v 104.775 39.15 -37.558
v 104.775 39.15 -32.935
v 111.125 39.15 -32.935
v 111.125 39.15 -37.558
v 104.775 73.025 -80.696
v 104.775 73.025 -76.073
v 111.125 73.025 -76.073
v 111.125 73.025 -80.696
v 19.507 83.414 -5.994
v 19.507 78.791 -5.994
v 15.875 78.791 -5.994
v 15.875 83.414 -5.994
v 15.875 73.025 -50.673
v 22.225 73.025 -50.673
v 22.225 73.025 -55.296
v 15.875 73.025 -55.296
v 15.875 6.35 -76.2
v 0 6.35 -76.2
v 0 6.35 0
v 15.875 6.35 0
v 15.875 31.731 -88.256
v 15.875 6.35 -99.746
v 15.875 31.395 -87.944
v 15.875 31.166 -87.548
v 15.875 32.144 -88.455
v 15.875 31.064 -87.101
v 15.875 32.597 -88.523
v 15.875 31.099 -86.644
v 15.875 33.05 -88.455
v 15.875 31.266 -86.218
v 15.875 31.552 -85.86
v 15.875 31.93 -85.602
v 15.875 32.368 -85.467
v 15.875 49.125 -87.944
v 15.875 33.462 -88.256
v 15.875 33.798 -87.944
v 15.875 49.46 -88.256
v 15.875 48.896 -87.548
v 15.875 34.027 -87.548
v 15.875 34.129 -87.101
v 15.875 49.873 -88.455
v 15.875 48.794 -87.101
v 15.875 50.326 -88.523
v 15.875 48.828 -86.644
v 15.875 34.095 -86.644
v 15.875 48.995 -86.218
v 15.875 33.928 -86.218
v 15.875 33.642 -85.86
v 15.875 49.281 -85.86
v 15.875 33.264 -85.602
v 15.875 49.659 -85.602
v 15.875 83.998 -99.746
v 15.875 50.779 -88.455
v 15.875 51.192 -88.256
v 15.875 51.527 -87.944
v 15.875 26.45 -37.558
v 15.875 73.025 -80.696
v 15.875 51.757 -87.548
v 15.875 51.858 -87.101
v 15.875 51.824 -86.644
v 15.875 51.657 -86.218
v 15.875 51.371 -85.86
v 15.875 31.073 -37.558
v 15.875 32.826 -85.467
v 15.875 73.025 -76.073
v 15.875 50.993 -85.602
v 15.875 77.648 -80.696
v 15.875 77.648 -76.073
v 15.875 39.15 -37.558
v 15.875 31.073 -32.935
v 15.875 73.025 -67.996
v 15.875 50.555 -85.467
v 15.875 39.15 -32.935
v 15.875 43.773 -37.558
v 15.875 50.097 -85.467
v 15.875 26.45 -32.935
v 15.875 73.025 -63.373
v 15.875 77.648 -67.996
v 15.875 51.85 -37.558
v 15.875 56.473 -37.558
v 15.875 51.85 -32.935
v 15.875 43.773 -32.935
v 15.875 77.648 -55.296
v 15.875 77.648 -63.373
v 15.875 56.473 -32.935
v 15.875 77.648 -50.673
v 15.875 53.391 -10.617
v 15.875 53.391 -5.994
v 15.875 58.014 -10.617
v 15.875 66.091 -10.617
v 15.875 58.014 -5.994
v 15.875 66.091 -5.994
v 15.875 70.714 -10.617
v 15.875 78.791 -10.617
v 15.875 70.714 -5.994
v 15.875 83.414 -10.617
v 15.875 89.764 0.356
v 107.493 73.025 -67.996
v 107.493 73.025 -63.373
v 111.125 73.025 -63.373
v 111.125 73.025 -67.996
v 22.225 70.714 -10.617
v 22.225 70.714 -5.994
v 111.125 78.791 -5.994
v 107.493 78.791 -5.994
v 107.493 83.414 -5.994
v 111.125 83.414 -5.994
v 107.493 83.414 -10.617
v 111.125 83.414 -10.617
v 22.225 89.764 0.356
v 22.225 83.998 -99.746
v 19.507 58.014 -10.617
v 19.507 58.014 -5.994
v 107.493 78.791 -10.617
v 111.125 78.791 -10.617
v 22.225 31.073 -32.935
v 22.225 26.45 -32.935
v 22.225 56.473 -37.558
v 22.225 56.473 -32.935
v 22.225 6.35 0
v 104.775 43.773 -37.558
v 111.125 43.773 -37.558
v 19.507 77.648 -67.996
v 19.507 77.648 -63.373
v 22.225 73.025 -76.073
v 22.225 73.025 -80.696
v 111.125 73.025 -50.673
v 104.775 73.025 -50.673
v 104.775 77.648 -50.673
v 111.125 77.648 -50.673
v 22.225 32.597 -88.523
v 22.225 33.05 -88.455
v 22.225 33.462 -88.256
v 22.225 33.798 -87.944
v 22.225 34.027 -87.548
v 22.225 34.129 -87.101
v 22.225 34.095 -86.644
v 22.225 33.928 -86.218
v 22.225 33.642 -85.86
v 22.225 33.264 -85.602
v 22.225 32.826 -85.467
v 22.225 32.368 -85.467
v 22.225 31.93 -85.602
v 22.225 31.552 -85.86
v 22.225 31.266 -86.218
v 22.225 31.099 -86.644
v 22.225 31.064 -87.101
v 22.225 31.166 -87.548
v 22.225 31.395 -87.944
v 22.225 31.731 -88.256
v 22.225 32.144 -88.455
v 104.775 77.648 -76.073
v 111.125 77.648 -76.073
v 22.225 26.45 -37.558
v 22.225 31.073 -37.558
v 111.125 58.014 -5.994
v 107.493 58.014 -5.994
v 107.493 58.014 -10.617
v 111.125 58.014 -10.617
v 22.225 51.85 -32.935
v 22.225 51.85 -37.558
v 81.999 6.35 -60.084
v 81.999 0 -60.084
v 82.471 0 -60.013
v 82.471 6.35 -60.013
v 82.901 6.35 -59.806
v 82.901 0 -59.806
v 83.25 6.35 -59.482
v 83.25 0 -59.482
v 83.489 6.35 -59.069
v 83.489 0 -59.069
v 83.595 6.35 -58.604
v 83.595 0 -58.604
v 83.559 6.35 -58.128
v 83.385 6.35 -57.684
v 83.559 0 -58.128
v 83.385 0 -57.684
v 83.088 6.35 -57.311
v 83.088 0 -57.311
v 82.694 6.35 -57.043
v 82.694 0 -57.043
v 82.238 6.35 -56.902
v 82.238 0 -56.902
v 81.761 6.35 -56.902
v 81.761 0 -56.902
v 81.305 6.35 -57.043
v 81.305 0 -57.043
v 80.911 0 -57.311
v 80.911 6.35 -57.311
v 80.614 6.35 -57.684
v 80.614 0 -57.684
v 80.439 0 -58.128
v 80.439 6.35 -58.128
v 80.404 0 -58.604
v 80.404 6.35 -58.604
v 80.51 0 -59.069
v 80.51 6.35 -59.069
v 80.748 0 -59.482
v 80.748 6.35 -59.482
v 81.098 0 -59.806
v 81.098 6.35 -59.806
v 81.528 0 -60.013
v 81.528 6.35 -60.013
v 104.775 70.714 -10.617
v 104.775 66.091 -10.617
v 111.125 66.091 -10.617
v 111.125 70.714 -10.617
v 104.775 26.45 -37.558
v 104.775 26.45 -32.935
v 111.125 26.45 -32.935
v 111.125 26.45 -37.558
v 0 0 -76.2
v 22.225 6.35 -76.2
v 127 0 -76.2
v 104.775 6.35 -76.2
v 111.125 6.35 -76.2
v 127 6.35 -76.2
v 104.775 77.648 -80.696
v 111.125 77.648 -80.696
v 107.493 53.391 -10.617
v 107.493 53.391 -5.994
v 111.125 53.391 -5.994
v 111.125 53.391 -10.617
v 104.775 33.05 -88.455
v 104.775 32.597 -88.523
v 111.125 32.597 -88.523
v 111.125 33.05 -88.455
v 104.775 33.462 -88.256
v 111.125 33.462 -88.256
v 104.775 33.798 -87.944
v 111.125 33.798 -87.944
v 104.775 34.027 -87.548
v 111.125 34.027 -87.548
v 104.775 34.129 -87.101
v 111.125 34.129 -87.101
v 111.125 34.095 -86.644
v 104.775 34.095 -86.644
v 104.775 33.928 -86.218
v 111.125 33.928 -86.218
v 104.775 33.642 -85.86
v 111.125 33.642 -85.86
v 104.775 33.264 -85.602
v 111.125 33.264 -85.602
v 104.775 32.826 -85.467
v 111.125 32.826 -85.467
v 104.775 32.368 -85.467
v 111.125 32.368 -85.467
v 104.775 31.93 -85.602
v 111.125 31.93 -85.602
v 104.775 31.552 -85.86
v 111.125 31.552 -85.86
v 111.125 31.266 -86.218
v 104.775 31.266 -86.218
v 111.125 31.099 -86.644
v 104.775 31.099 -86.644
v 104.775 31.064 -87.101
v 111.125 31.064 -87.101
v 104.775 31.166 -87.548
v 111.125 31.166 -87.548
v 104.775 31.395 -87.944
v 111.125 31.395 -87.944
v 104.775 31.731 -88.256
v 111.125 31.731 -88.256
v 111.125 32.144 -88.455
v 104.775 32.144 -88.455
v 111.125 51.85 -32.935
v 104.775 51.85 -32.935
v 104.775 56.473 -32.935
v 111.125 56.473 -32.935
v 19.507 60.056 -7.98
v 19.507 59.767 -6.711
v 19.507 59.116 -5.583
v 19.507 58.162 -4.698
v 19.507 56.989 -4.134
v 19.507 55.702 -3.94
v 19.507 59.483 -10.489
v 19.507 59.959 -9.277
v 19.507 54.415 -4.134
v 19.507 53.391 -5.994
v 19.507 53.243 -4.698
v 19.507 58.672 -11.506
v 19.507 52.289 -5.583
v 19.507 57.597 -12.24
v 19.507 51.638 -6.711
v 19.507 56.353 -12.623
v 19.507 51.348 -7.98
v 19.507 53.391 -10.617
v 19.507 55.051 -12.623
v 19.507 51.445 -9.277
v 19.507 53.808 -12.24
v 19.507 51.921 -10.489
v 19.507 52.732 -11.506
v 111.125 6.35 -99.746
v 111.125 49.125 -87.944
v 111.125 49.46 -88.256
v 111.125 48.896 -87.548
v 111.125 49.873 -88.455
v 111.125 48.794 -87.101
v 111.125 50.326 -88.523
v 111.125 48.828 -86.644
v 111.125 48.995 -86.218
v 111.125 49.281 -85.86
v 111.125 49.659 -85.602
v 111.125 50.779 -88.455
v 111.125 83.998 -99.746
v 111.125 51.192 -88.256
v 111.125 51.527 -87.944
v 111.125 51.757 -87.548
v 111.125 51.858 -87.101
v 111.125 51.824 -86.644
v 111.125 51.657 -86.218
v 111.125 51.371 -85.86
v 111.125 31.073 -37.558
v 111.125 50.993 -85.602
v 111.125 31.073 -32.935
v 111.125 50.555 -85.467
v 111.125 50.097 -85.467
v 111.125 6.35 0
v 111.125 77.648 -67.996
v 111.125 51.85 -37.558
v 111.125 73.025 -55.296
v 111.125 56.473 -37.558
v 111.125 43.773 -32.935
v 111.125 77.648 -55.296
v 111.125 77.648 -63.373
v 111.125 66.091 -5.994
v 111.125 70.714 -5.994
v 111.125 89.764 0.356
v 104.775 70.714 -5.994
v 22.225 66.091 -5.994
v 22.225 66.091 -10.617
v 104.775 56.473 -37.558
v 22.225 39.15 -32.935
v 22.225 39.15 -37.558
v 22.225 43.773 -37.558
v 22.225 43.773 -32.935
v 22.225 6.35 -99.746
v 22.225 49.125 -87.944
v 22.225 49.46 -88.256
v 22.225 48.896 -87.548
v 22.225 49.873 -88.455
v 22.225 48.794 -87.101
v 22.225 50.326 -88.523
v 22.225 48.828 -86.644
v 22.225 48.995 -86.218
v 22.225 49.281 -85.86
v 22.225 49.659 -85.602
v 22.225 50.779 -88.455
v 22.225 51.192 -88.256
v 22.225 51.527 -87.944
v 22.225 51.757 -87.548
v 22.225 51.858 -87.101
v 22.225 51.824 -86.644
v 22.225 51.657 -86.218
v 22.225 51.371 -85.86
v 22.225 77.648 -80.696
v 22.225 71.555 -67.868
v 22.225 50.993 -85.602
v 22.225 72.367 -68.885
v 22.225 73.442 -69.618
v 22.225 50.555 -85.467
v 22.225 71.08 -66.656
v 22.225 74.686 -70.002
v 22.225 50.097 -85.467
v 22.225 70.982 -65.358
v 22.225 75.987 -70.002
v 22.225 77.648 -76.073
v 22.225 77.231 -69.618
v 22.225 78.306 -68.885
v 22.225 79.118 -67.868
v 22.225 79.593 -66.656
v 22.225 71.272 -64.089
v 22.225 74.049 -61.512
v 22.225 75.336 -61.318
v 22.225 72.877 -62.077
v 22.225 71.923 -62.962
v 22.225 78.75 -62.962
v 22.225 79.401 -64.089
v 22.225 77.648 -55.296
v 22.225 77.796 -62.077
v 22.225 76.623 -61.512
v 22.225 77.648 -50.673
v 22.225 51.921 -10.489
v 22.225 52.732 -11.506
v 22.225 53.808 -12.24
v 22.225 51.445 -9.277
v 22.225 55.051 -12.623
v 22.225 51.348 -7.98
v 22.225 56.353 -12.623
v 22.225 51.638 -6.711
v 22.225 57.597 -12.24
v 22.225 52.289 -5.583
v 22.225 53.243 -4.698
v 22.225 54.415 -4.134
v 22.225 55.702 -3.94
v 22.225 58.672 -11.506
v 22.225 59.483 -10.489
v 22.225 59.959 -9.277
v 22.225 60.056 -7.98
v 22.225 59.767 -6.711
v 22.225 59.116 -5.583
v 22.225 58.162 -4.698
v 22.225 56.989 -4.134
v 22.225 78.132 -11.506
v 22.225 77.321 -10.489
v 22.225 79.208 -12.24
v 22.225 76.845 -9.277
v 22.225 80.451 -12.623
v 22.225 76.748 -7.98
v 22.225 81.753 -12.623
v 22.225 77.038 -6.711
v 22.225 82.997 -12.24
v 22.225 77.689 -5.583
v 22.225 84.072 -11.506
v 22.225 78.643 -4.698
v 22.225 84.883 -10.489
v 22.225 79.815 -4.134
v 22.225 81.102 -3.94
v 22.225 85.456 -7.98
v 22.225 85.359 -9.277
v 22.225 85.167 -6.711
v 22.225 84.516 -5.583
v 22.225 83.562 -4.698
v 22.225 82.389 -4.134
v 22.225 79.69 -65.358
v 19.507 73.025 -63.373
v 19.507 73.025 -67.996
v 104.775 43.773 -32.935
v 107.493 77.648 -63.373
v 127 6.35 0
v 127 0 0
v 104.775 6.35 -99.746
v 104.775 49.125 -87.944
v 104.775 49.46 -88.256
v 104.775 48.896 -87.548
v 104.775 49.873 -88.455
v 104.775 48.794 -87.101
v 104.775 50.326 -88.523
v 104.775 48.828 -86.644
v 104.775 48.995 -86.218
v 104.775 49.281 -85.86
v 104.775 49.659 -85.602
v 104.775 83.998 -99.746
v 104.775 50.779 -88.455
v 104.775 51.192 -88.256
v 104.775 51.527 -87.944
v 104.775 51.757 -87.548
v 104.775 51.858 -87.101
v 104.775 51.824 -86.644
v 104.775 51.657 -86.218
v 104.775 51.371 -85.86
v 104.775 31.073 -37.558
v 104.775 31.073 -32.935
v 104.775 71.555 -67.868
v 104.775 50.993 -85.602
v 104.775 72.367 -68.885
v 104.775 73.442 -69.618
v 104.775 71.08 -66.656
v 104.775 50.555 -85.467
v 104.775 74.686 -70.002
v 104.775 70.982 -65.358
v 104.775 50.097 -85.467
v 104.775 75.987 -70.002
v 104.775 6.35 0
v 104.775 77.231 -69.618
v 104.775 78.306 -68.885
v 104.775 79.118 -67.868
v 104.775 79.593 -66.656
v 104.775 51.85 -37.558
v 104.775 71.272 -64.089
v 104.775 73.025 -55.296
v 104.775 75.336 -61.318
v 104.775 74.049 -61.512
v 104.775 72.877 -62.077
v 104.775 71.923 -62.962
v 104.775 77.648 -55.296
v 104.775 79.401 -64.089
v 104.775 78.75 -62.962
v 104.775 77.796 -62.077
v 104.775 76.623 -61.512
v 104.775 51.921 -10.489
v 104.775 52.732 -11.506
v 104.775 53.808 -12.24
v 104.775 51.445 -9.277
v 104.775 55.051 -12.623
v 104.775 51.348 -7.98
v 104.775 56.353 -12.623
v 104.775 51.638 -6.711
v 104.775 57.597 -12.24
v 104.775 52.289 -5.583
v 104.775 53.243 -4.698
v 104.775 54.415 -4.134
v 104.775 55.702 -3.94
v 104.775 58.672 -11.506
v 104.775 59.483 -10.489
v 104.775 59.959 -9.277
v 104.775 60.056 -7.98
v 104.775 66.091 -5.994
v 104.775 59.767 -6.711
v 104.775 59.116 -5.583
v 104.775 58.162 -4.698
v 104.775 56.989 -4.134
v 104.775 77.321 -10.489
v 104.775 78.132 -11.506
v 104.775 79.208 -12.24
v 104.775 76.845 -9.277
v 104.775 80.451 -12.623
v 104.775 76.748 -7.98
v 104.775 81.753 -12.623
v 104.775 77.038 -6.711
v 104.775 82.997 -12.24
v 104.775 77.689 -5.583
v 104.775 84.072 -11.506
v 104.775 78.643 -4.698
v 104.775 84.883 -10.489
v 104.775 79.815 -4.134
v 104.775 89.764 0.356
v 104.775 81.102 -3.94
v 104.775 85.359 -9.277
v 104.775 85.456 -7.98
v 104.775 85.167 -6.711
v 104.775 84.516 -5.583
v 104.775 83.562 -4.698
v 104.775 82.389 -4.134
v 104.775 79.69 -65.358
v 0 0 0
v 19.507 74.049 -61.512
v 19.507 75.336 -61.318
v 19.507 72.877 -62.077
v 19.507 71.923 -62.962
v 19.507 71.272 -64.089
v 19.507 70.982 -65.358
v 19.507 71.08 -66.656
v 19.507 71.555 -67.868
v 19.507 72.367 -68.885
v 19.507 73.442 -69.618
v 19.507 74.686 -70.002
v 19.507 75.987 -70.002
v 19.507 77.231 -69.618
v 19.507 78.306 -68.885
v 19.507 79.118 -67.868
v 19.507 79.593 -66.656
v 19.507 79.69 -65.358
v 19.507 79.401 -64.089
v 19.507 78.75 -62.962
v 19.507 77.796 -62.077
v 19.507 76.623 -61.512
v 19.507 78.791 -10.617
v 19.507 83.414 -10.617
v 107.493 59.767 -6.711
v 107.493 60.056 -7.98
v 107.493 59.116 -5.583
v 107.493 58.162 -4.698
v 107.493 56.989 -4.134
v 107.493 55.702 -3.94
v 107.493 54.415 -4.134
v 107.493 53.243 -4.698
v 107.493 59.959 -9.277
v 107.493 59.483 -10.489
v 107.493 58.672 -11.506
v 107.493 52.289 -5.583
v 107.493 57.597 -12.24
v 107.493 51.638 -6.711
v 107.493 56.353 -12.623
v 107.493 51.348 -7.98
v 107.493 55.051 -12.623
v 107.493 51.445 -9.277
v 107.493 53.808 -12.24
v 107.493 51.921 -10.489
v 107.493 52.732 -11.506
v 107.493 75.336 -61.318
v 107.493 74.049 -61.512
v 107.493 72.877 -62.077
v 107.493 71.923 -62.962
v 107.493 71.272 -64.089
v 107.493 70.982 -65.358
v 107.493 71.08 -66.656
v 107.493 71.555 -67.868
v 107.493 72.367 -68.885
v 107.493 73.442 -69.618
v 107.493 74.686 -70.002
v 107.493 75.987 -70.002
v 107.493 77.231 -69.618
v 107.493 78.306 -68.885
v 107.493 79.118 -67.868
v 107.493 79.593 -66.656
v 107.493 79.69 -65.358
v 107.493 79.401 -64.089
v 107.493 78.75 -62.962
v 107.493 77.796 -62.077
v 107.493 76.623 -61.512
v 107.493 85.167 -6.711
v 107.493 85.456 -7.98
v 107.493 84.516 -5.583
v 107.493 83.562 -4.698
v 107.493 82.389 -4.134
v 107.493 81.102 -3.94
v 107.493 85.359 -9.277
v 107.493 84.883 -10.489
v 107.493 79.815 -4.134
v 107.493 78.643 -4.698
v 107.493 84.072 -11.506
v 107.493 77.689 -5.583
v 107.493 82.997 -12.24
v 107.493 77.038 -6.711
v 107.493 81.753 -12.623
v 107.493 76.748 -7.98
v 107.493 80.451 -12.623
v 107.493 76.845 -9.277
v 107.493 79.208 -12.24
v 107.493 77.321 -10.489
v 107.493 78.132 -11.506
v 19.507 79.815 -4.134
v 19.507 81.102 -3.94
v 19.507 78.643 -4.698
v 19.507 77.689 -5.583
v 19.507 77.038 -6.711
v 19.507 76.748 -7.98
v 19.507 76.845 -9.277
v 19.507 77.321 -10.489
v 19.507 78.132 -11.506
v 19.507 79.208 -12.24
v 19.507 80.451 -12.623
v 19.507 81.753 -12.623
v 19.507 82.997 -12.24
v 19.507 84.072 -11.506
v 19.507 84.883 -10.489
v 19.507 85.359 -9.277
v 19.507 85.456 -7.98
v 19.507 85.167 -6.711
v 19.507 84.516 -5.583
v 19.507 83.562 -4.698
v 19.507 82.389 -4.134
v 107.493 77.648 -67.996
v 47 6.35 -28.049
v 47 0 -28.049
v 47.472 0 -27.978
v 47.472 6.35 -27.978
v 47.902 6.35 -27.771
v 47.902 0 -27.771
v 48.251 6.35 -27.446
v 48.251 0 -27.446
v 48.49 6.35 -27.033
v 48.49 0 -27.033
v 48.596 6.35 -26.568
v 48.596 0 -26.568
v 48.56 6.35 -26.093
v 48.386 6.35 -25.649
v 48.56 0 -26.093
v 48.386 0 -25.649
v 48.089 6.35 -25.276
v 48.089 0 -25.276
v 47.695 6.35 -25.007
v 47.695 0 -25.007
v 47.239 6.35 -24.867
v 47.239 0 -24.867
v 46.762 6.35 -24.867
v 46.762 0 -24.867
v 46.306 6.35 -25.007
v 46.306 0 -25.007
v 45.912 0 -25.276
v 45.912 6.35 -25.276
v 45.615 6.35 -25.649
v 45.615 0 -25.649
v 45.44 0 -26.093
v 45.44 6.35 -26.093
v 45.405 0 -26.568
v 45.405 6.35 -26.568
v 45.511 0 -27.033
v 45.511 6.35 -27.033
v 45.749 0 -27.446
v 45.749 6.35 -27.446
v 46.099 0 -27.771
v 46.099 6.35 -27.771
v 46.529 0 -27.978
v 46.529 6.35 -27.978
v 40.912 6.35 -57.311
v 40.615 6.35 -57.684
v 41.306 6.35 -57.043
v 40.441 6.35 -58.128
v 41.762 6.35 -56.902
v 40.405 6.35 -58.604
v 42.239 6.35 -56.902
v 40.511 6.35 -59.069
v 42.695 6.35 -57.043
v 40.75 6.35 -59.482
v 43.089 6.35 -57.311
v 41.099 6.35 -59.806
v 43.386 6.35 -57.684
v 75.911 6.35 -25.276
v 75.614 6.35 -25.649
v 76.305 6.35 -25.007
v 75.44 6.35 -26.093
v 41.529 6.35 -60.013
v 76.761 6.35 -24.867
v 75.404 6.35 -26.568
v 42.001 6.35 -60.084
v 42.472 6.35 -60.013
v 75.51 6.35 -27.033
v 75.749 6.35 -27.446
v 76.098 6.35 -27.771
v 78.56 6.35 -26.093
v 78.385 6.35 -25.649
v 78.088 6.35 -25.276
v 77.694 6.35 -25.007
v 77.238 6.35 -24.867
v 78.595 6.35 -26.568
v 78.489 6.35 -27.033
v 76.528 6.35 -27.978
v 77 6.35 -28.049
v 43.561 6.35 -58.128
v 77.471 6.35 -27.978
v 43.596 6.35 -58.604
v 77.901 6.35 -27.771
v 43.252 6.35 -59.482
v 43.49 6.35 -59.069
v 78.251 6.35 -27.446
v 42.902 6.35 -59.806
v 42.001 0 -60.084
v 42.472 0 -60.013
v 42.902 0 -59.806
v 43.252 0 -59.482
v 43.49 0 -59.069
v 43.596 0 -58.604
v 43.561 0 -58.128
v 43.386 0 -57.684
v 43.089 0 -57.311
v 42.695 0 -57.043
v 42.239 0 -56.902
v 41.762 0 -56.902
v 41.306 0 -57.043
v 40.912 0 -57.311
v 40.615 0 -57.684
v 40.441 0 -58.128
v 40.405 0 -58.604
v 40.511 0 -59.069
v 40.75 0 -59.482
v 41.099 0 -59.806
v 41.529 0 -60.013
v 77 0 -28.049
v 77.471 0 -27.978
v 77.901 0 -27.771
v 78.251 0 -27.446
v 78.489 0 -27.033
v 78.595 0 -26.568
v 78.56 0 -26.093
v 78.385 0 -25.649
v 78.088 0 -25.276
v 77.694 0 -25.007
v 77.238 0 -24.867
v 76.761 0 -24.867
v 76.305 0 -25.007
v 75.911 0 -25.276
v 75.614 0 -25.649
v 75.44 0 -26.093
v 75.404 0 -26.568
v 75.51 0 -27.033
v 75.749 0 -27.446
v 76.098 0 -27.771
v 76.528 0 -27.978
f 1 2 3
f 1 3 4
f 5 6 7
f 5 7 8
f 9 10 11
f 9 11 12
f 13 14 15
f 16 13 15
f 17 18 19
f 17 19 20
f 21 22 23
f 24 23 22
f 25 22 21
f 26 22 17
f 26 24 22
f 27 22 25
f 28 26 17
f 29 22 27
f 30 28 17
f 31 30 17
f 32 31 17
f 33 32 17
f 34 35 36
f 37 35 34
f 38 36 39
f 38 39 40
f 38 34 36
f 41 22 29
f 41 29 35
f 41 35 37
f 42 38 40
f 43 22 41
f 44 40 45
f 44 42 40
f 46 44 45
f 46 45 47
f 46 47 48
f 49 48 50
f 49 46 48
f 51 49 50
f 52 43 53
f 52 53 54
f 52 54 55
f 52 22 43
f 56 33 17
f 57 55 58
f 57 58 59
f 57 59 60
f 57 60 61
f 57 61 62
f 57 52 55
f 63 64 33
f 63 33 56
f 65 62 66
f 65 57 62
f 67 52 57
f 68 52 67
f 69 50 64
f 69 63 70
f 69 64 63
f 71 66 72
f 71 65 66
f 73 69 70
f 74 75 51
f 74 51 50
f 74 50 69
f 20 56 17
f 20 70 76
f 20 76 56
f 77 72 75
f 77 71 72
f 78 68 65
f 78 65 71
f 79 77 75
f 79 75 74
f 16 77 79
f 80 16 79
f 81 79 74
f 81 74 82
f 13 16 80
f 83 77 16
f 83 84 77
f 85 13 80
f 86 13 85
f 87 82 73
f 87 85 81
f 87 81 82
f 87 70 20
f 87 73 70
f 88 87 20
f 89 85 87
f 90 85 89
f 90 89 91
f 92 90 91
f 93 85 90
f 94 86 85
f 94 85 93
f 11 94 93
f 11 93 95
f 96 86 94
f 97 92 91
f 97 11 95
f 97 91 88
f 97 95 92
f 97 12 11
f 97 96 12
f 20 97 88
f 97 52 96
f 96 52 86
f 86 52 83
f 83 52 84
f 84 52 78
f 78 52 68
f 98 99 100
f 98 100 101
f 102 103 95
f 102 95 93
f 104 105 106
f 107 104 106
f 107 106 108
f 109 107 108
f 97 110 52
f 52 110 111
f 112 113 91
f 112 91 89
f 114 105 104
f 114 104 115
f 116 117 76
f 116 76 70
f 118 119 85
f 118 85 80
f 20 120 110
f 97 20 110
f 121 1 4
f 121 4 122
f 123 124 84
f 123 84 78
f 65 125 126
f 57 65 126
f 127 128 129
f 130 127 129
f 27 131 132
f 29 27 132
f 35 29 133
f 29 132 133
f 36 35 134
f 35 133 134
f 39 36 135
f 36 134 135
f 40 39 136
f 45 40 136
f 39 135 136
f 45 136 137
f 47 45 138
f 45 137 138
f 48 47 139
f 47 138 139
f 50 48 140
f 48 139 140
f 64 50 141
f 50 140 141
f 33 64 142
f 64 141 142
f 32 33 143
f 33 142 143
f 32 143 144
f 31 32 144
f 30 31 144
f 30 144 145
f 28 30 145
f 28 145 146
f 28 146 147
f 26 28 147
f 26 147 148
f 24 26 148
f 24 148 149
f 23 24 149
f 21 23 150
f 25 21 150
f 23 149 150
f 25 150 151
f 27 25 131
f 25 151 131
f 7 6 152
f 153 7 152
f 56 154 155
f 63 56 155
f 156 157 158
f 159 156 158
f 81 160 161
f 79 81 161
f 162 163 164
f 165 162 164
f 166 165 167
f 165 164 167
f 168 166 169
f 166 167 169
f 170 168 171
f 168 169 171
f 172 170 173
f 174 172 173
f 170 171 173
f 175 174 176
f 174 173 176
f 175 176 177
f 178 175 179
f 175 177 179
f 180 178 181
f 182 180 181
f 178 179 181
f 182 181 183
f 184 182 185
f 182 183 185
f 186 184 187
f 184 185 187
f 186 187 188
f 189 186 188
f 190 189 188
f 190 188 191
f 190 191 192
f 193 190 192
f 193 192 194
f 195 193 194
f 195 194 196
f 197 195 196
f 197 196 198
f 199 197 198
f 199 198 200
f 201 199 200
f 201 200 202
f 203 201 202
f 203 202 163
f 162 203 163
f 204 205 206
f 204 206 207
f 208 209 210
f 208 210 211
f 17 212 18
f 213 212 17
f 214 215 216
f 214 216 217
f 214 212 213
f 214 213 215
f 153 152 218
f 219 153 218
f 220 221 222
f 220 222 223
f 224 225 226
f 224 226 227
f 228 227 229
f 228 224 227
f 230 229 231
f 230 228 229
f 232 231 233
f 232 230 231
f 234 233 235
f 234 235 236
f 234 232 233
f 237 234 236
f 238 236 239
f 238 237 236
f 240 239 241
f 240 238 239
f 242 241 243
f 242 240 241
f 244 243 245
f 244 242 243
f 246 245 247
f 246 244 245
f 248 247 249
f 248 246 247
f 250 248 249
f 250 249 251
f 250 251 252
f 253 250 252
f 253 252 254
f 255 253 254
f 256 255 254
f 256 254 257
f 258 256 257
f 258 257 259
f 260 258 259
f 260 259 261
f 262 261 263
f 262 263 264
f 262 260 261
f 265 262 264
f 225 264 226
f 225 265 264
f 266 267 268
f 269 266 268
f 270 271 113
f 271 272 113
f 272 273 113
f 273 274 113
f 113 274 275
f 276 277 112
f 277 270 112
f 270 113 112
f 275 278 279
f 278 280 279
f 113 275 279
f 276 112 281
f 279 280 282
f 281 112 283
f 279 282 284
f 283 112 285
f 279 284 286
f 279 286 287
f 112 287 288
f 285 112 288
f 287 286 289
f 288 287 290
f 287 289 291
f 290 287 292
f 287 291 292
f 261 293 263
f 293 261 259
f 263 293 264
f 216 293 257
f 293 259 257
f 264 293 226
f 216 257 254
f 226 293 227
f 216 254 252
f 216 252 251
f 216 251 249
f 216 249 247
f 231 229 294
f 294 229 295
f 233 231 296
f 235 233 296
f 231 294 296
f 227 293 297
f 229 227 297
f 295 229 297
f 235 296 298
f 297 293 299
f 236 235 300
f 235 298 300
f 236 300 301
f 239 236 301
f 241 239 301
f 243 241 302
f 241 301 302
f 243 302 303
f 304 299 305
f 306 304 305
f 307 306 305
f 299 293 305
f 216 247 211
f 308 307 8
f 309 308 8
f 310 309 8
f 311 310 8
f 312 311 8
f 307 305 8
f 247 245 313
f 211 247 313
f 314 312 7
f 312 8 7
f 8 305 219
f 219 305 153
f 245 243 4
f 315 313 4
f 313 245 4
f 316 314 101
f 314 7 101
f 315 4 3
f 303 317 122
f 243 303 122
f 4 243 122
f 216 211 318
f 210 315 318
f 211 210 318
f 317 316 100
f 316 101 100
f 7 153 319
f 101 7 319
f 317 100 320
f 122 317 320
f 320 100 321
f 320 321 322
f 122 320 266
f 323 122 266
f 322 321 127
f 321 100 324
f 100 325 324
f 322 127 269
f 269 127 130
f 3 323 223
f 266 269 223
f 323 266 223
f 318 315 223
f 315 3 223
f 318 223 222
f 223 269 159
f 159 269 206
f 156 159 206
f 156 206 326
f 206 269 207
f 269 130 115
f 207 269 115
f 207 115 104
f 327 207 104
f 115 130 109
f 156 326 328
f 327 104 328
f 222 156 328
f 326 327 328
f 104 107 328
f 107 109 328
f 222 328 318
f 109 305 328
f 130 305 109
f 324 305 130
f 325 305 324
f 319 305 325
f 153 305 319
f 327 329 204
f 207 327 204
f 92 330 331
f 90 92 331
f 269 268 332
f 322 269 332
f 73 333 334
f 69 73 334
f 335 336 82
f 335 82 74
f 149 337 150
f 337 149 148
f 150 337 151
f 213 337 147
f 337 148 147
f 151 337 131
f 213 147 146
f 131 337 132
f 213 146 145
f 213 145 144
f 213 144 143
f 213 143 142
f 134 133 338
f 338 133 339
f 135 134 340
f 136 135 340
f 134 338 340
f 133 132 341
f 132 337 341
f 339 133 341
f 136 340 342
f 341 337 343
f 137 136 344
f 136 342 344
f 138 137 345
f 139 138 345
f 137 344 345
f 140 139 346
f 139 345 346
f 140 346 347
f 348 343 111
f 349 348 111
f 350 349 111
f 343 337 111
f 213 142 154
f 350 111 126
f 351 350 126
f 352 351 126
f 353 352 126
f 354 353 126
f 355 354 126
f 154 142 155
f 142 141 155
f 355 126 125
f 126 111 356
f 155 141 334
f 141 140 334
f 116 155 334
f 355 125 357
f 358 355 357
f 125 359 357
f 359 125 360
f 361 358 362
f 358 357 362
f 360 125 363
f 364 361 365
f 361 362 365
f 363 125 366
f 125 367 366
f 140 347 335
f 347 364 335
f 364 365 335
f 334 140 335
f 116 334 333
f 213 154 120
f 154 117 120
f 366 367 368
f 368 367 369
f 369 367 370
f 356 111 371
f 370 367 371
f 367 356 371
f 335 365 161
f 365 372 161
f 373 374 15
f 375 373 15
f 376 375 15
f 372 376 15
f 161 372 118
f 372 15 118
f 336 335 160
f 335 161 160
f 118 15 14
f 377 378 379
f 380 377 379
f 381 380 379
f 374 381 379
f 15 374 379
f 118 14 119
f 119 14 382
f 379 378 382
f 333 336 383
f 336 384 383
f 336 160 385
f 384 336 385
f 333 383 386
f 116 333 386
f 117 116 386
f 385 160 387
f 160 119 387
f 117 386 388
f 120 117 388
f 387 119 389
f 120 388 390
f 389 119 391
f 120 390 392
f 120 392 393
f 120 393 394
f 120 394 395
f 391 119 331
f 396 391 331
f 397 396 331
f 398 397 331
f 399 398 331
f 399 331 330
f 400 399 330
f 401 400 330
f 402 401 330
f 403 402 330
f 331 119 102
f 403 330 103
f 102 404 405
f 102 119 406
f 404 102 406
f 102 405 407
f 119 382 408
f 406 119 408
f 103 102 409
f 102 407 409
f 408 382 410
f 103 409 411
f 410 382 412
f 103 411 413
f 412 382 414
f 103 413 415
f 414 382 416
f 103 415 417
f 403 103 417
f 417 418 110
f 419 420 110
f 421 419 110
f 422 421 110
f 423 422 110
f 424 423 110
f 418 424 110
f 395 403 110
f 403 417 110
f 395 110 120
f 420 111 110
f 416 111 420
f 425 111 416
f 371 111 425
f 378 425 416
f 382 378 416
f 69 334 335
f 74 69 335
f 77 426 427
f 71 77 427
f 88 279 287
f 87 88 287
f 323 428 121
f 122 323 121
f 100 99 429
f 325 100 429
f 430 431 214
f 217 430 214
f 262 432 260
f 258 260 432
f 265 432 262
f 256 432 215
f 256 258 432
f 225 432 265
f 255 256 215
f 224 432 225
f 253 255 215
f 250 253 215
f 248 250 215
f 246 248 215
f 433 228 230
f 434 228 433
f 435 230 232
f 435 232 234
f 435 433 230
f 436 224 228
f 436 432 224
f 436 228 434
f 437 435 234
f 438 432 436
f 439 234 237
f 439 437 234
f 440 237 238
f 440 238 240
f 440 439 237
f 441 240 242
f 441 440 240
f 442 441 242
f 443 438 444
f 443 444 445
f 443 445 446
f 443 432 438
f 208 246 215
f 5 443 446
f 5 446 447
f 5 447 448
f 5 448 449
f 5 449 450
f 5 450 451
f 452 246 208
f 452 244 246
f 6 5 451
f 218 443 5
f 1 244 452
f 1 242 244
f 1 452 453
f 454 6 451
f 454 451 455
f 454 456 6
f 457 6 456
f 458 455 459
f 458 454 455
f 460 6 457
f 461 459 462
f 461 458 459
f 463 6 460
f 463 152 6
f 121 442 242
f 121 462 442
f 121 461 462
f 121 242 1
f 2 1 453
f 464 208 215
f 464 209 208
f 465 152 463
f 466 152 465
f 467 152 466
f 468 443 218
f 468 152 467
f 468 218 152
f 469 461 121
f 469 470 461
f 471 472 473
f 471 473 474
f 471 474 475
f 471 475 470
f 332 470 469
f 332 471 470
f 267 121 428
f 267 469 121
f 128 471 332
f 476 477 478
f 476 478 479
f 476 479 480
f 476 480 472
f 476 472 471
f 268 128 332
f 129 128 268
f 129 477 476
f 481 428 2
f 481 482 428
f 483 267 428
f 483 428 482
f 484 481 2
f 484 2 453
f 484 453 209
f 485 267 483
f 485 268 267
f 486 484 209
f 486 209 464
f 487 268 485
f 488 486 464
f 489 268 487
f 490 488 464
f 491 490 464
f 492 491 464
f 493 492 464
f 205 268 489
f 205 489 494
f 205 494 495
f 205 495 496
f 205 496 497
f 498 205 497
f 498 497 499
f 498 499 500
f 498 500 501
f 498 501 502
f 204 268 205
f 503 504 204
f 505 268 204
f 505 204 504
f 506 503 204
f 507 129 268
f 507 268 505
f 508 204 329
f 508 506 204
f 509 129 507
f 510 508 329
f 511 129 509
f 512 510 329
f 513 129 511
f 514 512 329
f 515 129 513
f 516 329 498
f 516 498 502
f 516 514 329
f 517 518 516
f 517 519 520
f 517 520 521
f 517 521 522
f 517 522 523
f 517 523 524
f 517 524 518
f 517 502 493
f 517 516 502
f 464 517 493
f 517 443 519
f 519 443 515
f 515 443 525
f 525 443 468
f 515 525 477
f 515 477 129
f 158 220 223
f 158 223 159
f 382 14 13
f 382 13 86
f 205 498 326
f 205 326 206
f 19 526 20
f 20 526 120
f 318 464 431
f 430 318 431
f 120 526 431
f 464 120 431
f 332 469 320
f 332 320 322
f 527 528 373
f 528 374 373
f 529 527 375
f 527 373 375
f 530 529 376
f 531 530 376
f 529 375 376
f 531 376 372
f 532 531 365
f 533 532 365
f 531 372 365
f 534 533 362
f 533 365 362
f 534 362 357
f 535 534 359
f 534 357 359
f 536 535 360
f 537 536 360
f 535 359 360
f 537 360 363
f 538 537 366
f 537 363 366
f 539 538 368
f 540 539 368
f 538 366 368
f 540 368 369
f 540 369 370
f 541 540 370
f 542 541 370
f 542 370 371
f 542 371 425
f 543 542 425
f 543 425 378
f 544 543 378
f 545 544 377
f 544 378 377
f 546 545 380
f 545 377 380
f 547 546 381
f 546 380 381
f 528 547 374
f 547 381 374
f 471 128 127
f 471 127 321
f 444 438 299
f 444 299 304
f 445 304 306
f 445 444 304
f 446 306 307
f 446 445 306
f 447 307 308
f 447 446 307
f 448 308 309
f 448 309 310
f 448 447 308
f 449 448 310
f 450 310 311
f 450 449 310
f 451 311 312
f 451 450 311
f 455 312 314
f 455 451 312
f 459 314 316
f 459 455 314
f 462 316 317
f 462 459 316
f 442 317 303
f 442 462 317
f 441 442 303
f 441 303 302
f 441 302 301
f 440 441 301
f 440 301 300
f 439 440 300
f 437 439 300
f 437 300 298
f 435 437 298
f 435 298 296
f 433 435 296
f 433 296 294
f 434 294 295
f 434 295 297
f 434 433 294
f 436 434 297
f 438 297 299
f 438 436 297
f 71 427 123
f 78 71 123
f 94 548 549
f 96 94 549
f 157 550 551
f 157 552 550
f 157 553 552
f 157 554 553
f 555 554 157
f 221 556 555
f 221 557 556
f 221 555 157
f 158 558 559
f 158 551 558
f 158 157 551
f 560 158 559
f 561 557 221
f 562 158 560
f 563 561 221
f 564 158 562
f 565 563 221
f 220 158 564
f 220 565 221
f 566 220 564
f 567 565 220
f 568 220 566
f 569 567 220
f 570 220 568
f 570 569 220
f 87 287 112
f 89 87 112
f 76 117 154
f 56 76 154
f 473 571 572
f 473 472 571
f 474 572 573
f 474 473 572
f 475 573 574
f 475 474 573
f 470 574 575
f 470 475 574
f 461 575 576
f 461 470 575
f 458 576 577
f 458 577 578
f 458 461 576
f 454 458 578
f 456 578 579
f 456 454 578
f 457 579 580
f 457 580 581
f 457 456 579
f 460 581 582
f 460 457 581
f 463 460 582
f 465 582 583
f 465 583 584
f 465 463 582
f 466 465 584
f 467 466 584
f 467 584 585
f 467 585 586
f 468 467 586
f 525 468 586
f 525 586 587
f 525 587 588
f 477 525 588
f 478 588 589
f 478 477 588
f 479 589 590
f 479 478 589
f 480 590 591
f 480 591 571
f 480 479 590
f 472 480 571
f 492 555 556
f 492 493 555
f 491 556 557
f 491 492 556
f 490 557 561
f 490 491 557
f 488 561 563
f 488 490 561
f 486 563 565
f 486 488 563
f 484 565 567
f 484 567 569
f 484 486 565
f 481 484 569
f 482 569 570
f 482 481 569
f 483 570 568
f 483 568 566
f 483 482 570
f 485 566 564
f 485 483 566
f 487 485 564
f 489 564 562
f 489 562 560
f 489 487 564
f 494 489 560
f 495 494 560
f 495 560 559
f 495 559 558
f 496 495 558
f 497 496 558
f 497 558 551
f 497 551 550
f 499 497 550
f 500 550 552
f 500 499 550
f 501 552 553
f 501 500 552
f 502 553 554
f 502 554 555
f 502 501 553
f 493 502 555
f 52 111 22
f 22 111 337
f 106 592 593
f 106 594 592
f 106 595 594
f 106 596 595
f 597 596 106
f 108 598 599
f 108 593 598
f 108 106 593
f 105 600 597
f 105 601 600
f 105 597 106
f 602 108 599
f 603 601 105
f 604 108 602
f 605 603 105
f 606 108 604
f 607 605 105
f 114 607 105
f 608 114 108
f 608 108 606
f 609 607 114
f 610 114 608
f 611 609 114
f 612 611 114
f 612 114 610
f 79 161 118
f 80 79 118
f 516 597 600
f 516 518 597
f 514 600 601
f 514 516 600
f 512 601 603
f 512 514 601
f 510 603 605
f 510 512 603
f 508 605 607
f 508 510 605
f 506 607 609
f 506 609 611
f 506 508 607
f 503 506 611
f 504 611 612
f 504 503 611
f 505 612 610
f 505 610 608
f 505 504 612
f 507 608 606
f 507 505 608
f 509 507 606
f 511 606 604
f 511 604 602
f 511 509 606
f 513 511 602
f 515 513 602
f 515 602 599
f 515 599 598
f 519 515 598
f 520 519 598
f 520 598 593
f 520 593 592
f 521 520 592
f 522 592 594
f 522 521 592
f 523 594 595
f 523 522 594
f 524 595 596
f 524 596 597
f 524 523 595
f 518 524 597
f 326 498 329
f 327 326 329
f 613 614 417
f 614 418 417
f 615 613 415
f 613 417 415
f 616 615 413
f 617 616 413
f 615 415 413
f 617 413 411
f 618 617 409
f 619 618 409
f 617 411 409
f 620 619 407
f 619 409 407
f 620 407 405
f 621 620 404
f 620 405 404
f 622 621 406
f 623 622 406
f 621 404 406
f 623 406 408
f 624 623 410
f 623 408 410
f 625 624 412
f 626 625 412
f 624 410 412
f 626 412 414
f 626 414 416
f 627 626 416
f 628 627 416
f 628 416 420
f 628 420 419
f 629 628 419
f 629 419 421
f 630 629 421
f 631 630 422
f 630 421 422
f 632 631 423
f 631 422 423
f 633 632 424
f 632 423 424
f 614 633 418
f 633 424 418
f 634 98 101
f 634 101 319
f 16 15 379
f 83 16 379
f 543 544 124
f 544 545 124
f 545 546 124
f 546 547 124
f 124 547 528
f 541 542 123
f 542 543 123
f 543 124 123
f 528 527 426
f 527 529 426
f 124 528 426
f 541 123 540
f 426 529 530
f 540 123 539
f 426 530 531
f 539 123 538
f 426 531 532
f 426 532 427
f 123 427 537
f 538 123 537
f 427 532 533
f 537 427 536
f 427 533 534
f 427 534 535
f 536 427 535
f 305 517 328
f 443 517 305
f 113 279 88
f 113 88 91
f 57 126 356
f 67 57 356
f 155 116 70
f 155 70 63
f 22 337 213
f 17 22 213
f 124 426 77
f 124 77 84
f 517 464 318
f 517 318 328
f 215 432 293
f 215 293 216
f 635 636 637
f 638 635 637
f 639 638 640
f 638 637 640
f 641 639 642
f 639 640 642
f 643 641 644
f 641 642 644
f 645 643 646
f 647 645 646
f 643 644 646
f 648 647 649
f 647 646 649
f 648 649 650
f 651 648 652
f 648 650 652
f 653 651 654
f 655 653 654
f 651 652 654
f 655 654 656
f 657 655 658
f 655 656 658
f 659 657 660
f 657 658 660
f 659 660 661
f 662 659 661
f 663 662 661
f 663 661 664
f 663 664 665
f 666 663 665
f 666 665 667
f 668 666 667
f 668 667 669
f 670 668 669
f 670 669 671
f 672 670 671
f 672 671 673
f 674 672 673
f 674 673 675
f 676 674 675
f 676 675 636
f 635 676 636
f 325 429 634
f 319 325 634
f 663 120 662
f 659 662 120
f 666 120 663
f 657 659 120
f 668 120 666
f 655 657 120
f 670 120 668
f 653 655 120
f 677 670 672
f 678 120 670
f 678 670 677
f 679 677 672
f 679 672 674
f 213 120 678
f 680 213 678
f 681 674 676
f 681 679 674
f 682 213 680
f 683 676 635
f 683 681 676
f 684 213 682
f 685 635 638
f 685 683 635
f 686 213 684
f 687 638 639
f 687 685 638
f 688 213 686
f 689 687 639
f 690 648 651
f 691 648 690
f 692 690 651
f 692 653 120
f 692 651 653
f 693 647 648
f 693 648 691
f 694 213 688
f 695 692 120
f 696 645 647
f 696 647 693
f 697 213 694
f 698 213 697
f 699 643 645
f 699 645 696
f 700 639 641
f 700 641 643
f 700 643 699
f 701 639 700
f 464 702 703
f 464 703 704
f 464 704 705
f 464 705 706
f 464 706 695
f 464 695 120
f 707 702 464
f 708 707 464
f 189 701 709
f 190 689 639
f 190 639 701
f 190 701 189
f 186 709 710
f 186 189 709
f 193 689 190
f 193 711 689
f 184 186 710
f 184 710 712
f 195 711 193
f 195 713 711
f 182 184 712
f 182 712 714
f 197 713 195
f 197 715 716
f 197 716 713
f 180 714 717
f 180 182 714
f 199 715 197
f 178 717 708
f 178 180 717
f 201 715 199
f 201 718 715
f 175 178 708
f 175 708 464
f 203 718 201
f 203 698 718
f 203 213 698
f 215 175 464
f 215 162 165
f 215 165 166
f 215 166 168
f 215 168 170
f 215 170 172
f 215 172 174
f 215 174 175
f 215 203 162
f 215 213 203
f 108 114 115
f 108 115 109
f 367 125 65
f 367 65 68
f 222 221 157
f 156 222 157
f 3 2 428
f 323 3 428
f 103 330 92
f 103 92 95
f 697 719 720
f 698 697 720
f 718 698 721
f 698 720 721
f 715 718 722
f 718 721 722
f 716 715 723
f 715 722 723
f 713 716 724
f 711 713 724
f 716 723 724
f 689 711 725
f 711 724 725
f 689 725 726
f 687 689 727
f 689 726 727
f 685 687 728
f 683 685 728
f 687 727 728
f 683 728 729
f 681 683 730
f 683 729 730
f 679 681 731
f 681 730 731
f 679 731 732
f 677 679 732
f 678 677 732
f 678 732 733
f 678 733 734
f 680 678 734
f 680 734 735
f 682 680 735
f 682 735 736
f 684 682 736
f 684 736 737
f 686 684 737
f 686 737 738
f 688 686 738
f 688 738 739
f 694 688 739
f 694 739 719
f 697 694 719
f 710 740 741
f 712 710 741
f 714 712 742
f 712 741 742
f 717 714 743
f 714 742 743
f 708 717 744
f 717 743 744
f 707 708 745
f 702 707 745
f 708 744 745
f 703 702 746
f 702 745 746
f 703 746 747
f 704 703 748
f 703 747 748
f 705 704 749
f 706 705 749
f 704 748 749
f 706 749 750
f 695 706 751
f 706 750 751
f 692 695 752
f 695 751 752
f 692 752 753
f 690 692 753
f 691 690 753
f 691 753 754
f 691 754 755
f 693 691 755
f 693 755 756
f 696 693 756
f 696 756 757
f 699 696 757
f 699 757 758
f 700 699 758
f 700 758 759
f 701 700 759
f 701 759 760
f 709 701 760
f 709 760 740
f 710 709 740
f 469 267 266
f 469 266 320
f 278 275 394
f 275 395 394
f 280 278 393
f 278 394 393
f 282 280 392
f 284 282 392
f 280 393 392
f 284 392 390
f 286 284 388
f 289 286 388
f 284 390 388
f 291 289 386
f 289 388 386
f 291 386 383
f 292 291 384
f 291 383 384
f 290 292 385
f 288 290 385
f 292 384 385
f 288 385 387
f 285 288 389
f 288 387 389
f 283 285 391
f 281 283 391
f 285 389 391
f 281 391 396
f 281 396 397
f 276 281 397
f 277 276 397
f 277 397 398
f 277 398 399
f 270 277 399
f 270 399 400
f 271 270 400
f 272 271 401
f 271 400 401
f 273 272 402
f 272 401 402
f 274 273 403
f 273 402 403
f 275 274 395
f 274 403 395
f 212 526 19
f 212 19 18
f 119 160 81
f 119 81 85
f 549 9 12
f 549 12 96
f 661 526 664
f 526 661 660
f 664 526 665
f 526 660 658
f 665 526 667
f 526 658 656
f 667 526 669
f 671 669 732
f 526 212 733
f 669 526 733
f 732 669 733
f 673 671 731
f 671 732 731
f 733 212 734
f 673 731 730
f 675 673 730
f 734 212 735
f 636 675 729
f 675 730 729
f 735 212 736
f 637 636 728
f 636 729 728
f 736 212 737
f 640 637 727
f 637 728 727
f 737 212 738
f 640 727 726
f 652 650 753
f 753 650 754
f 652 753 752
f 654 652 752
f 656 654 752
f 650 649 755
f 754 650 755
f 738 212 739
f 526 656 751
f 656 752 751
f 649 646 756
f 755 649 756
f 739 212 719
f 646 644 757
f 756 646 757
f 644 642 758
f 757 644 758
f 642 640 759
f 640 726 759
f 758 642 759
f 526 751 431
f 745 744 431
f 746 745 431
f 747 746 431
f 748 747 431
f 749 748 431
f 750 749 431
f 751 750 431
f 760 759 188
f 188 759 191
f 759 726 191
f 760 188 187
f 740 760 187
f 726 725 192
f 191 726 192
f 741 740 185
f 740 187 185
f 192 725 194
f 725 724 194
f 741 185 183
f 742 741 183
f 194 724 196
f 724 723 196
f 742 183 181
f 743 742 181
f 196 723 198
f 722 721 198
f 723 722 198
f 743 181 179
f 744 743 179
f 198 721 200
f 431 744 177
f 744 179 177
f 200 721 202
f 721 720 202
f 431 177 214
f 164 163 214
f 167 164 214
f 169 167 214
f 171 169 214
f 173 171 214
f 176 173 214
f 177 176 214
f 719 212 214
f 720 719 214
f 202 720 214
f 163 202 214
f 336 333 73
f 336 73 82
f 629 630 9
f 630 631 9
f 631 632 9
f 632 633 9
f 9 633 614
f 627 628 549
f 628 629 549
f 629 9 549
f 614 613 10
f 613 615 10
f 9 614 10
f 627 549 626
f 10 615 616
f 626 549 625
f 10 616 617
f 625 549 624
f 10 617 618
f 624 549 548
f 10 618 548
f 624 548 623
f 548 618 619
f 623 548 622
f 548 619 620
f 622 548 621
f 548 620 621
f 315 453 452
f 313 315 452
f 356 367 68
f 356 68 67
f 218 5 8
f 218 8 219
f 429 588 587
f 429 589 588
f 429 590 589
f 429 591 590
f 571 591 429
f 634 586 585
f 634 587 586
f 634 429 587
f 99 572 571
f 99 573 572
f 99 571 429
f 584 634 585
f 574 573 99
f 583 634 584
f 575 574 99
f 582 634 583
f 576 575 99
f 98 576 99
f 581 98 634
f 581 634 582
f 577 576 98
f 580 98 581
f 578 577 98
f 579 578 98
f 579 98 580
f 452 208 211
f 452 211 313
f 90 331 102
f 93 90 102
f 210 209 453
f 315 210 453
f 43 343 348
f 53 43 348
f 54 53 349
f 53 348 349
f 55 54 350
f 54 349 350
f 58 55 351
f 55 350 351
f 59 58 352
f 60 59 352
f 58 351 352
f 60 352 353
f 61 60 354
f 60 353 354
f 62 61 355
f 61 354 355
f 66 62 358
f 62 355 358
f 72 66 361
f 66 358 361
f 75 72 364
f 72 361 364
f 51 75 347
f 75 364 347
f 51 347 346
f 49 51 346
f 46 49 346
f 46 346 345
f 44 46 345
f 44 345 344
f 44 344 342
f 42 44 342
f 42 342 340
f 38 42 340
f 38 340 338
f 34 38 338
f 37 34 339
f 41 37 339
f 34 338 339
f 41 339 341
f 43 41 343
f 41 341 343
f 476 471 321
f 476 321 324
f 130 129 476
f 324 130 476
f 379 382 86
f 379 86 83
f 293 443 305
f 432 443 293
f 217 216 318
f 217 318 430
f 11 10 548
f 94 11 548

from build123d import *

# Parameters (mm, degrees)
SKETCH1_W                                     = 127
SKETCH1_H                                     = 76.2
BOSS_EXTRUDE1_DEPTH                           = 6.35
SKETCH3_R                                     = 1.5367
SKETCH3_W                                     = 4.6228
SKETCH3_H                                     = 4.6228
BOSS_EXTRUDE2_DEPTH                           = 6.35
CBORE_FOR_8_BUTTON_HEAD_CAP_SCREW1_AT_2_COUNT = 2
CBORE_FOR_8_BUTTON_HEAD_CAP_SCREW1_AT_2_PITCH = 57.667566167
CBORE_FOR_8_BUTTON_HEAD_CAP_SCREW1_AT_3_COUNT = 2
CBORE_FOR_8_BUTTON_HEAD_CAP_SCREW1_AT_3_PITCH = 60.644913617
SKETCH4_R                                     = 1.6
CUT_EXTRUDE1_DEPTH                            = 185.758568144


with BuildPart() as part:
    # Sketch1 → Boss-Extrude1 (new body)
    with BuildSketch(Plane(origin=(0, 0, 0), x_dir=(1, 0, 0), z_dir=(0, 1, 0))):
        with Locations((63.5, 38.1)):
            Rectangle(SKETCH1_W, SKETCH1_H)
    extrude(amount=BOSS_EXTRUDE1_DEPTH)

    # Sketch3 → Boss-Extrude2 (add)
    with BuildSketch(Plane(origin=(104.775, 0, 0), x_dir=(0, 0, -1), z_dir=(1, 0, 0))):
        Polygon((0, 6.35), (-0.3556, 89.7636), (99.7458, 83.9978), (99.7458, 6.35), align=None)
        with Locations((86.986368363, 50.326031637)):
            Circle(SKETCH3_R, mode=Mode.SUBTRACT)
        with Locations((86.986368363, 32.596831637)):
            Circle(SKETCH3_R, mode=Mode.SUBTRACT)
        with Locations((8.3058, 55.7022)):
            Rectangle(SKETCH3_W, SKETCH3_H, mode=Mode.SUBTRACT)
        with Locations((8.3058, 68.4022)):
            Rectangle(SKETCH3_W, SKETCH3_H, mode=Mode.SUBTRACT)
        with Locations((35.246568363, 41.461431637)):
            Rectangle(SKETCH3_W, SKETCH3_H, mode=Mode.SUBTRACT)
        with Locations((78.3844, 75.3364)):
            Rectangle(SKETCH3_W, SKETCH3_H, mode=Mode.SUBTRACT)
        with Locations((8.3058, 81.1022)):
            Rectangle(SKETCH3_W, SKETCH3_H, mode=Mode.SUBTRACT)
        with Locations((35.246568363, 54.161431637)):
            Rectangle(SKETCH3_W, SKETCH3_H, mode=Mode.SUBTRACT)
        with Locations((35.246568363, 28.761431637)):
            Rectangle(SKETCH3_W, SKETCH3_H, mode=Mode.SUBTRACT)
        with Locations((65.6844, 75.3364)):
            Rectangle(SKETCH3_W, SKETCH3_H, mode=Mode.SUBTRACT)
        with Locations((52.9844, 75.3364)):
            Rectangle(SKETCH3_W, SKETCH3_H, mode=Mode.SUBTRACT)
    boss_extrude2 = extrude(amount=BOSS_EXTRUDE2_DEPTH)

    # Sketch6 → CBORE for #8 Button Head Cap Screw1 (revolve, cut)
    with BuildSketch(Plane(origin=(104.775, 75.3364, -65.6844), x_dir=(0, 0, 1), z_dir=(0, 1, 0))):
        Polygon((0, 0), (0, 22.225), (2.2479, 22.225), (2.2479, 2.7178), (4.36626, 2.7178), (4.36626, 0), align=None)
    cbore_for_8_button_head_cap_screw1 = revolve(axis=Axis((98.425, 75.3364, -65.6844), (1, 0, 0)), mode=Mode.SUBTRACT)

    # CBORE for #8 Button Head Cap Screw1 at 2: CBORE for #8 Button Head Cap Screw1 ×2
    with Locations(*[Vector(0, 0.09998341153022382, 0.9949891041708838) * (i * CBORE_FOR_8_BUTTON_HEAD_CAP_SCREW1_AT_2_PITCH) for i in range(1, CBORE_FOR_8_BUTTON_HEAD_CAP_SCREW1_AT_2_COUNT)]):
        add(cbore_for_8_button_head_cap_screw1, mode=Mode.SUBTRACT)

    # CBORE for #8 Button Head Cap Screw1 at 3: CBORE for #8 Button Head Cap Screw1 ×2
    with Locations(*[Vector(0, -0.32375674774697566, 0.9461403533769719) * (i * CBORE_FOR_8_BUTTON_HEAD_CAP_SCREW1_AT_3_PITCH) for i in range(1, CBORE_FOR_8_BUTTON_HEAD_CAP_SCREW1_AT_3_COUNT)]):
        add(cbore_for_8_button_head_cap_screw1, mode=Mode.SUBTRACT)

    # Mirror1: Boss-Extrude2, CBORE for #8 Button Head Cap Screw1 across plane
    add(boss_extrude2.mirror(Plane(origin=(63.5, 0, 0), x_dir=(0, 0, 1), z_dir=(1, 0, 0))))
    add(cbore_for_8_button_head_cap_screw1.mirror(Plane(origin=(63.5, 0, 0), x_dir=(0, 0, 1), z_dir=(1, 0, 0))), mode=Mode.SUBTRACT)

    # Mirror1 copy 1 sketch → Mirror1 copy 1 (revolve, cut)
    with BuildSketch(Plane(origin=(22.225, 81.1022, -8.3058), x_dir=(0, 0, 1), z_dir=(0, 1, 0))):
        Polygon((0, 0), (0, -22.225), (2.2479, -22.225), (2.2479, -2.7178), (4.36626, -2.7178), (4.36626, 0), align=None)
    revolve(axis=Axis((28.575, 81.1022, -8.3058), (1, 0, 0)), mode=Mode.SUBTRACT)

    # Mirror1 copy 2 sketch → Mirror1 copy 2 (revolve, cut)
    with BuildSketch(Plane(origin=(22.225, 55.7022, -8.3058), x_dir=(0, 0, 1), z_dir=(0, 1, 0))):
        Polygon((0, 0), (0, -22.225), (2.2479, -22.225), (2.2479, -2.7178), (4.36626, -2.7178), (4.36626, 0), align=None)
    revolve(axis=Axis((28.575, 55.7022, -8.3058), (1, 0, 0)), mode=Mode.SUBTRACT)

    # Sketch4 → Cut-Extrude1 (cut, through all)
    with BuildSketch(Plane.XZ):
        with Locations(Location((76.999706662, -26.448823052, 0), (0, 0, 270))):
            Circle(SKETCH4_R)
        with Locations(Location((47.000293338, -26.448823052, 0), (0, 0, 270))):
            Circle(SKETCH4_R)
        with Locations(Location((81.99934001, -58.48420412, 0), (0, 0, 270))):
            Circle(SKETCH4_R)
        with Locations(Location((42.00065999, -58.48420412, 0), (0, 0, 270))):
            Circle(SKETCH4_R)
    extrude(amount=-CUT_EXTRUDE1_DEPTH, mode=Mode.SUBTRACT)


solid = part.part
